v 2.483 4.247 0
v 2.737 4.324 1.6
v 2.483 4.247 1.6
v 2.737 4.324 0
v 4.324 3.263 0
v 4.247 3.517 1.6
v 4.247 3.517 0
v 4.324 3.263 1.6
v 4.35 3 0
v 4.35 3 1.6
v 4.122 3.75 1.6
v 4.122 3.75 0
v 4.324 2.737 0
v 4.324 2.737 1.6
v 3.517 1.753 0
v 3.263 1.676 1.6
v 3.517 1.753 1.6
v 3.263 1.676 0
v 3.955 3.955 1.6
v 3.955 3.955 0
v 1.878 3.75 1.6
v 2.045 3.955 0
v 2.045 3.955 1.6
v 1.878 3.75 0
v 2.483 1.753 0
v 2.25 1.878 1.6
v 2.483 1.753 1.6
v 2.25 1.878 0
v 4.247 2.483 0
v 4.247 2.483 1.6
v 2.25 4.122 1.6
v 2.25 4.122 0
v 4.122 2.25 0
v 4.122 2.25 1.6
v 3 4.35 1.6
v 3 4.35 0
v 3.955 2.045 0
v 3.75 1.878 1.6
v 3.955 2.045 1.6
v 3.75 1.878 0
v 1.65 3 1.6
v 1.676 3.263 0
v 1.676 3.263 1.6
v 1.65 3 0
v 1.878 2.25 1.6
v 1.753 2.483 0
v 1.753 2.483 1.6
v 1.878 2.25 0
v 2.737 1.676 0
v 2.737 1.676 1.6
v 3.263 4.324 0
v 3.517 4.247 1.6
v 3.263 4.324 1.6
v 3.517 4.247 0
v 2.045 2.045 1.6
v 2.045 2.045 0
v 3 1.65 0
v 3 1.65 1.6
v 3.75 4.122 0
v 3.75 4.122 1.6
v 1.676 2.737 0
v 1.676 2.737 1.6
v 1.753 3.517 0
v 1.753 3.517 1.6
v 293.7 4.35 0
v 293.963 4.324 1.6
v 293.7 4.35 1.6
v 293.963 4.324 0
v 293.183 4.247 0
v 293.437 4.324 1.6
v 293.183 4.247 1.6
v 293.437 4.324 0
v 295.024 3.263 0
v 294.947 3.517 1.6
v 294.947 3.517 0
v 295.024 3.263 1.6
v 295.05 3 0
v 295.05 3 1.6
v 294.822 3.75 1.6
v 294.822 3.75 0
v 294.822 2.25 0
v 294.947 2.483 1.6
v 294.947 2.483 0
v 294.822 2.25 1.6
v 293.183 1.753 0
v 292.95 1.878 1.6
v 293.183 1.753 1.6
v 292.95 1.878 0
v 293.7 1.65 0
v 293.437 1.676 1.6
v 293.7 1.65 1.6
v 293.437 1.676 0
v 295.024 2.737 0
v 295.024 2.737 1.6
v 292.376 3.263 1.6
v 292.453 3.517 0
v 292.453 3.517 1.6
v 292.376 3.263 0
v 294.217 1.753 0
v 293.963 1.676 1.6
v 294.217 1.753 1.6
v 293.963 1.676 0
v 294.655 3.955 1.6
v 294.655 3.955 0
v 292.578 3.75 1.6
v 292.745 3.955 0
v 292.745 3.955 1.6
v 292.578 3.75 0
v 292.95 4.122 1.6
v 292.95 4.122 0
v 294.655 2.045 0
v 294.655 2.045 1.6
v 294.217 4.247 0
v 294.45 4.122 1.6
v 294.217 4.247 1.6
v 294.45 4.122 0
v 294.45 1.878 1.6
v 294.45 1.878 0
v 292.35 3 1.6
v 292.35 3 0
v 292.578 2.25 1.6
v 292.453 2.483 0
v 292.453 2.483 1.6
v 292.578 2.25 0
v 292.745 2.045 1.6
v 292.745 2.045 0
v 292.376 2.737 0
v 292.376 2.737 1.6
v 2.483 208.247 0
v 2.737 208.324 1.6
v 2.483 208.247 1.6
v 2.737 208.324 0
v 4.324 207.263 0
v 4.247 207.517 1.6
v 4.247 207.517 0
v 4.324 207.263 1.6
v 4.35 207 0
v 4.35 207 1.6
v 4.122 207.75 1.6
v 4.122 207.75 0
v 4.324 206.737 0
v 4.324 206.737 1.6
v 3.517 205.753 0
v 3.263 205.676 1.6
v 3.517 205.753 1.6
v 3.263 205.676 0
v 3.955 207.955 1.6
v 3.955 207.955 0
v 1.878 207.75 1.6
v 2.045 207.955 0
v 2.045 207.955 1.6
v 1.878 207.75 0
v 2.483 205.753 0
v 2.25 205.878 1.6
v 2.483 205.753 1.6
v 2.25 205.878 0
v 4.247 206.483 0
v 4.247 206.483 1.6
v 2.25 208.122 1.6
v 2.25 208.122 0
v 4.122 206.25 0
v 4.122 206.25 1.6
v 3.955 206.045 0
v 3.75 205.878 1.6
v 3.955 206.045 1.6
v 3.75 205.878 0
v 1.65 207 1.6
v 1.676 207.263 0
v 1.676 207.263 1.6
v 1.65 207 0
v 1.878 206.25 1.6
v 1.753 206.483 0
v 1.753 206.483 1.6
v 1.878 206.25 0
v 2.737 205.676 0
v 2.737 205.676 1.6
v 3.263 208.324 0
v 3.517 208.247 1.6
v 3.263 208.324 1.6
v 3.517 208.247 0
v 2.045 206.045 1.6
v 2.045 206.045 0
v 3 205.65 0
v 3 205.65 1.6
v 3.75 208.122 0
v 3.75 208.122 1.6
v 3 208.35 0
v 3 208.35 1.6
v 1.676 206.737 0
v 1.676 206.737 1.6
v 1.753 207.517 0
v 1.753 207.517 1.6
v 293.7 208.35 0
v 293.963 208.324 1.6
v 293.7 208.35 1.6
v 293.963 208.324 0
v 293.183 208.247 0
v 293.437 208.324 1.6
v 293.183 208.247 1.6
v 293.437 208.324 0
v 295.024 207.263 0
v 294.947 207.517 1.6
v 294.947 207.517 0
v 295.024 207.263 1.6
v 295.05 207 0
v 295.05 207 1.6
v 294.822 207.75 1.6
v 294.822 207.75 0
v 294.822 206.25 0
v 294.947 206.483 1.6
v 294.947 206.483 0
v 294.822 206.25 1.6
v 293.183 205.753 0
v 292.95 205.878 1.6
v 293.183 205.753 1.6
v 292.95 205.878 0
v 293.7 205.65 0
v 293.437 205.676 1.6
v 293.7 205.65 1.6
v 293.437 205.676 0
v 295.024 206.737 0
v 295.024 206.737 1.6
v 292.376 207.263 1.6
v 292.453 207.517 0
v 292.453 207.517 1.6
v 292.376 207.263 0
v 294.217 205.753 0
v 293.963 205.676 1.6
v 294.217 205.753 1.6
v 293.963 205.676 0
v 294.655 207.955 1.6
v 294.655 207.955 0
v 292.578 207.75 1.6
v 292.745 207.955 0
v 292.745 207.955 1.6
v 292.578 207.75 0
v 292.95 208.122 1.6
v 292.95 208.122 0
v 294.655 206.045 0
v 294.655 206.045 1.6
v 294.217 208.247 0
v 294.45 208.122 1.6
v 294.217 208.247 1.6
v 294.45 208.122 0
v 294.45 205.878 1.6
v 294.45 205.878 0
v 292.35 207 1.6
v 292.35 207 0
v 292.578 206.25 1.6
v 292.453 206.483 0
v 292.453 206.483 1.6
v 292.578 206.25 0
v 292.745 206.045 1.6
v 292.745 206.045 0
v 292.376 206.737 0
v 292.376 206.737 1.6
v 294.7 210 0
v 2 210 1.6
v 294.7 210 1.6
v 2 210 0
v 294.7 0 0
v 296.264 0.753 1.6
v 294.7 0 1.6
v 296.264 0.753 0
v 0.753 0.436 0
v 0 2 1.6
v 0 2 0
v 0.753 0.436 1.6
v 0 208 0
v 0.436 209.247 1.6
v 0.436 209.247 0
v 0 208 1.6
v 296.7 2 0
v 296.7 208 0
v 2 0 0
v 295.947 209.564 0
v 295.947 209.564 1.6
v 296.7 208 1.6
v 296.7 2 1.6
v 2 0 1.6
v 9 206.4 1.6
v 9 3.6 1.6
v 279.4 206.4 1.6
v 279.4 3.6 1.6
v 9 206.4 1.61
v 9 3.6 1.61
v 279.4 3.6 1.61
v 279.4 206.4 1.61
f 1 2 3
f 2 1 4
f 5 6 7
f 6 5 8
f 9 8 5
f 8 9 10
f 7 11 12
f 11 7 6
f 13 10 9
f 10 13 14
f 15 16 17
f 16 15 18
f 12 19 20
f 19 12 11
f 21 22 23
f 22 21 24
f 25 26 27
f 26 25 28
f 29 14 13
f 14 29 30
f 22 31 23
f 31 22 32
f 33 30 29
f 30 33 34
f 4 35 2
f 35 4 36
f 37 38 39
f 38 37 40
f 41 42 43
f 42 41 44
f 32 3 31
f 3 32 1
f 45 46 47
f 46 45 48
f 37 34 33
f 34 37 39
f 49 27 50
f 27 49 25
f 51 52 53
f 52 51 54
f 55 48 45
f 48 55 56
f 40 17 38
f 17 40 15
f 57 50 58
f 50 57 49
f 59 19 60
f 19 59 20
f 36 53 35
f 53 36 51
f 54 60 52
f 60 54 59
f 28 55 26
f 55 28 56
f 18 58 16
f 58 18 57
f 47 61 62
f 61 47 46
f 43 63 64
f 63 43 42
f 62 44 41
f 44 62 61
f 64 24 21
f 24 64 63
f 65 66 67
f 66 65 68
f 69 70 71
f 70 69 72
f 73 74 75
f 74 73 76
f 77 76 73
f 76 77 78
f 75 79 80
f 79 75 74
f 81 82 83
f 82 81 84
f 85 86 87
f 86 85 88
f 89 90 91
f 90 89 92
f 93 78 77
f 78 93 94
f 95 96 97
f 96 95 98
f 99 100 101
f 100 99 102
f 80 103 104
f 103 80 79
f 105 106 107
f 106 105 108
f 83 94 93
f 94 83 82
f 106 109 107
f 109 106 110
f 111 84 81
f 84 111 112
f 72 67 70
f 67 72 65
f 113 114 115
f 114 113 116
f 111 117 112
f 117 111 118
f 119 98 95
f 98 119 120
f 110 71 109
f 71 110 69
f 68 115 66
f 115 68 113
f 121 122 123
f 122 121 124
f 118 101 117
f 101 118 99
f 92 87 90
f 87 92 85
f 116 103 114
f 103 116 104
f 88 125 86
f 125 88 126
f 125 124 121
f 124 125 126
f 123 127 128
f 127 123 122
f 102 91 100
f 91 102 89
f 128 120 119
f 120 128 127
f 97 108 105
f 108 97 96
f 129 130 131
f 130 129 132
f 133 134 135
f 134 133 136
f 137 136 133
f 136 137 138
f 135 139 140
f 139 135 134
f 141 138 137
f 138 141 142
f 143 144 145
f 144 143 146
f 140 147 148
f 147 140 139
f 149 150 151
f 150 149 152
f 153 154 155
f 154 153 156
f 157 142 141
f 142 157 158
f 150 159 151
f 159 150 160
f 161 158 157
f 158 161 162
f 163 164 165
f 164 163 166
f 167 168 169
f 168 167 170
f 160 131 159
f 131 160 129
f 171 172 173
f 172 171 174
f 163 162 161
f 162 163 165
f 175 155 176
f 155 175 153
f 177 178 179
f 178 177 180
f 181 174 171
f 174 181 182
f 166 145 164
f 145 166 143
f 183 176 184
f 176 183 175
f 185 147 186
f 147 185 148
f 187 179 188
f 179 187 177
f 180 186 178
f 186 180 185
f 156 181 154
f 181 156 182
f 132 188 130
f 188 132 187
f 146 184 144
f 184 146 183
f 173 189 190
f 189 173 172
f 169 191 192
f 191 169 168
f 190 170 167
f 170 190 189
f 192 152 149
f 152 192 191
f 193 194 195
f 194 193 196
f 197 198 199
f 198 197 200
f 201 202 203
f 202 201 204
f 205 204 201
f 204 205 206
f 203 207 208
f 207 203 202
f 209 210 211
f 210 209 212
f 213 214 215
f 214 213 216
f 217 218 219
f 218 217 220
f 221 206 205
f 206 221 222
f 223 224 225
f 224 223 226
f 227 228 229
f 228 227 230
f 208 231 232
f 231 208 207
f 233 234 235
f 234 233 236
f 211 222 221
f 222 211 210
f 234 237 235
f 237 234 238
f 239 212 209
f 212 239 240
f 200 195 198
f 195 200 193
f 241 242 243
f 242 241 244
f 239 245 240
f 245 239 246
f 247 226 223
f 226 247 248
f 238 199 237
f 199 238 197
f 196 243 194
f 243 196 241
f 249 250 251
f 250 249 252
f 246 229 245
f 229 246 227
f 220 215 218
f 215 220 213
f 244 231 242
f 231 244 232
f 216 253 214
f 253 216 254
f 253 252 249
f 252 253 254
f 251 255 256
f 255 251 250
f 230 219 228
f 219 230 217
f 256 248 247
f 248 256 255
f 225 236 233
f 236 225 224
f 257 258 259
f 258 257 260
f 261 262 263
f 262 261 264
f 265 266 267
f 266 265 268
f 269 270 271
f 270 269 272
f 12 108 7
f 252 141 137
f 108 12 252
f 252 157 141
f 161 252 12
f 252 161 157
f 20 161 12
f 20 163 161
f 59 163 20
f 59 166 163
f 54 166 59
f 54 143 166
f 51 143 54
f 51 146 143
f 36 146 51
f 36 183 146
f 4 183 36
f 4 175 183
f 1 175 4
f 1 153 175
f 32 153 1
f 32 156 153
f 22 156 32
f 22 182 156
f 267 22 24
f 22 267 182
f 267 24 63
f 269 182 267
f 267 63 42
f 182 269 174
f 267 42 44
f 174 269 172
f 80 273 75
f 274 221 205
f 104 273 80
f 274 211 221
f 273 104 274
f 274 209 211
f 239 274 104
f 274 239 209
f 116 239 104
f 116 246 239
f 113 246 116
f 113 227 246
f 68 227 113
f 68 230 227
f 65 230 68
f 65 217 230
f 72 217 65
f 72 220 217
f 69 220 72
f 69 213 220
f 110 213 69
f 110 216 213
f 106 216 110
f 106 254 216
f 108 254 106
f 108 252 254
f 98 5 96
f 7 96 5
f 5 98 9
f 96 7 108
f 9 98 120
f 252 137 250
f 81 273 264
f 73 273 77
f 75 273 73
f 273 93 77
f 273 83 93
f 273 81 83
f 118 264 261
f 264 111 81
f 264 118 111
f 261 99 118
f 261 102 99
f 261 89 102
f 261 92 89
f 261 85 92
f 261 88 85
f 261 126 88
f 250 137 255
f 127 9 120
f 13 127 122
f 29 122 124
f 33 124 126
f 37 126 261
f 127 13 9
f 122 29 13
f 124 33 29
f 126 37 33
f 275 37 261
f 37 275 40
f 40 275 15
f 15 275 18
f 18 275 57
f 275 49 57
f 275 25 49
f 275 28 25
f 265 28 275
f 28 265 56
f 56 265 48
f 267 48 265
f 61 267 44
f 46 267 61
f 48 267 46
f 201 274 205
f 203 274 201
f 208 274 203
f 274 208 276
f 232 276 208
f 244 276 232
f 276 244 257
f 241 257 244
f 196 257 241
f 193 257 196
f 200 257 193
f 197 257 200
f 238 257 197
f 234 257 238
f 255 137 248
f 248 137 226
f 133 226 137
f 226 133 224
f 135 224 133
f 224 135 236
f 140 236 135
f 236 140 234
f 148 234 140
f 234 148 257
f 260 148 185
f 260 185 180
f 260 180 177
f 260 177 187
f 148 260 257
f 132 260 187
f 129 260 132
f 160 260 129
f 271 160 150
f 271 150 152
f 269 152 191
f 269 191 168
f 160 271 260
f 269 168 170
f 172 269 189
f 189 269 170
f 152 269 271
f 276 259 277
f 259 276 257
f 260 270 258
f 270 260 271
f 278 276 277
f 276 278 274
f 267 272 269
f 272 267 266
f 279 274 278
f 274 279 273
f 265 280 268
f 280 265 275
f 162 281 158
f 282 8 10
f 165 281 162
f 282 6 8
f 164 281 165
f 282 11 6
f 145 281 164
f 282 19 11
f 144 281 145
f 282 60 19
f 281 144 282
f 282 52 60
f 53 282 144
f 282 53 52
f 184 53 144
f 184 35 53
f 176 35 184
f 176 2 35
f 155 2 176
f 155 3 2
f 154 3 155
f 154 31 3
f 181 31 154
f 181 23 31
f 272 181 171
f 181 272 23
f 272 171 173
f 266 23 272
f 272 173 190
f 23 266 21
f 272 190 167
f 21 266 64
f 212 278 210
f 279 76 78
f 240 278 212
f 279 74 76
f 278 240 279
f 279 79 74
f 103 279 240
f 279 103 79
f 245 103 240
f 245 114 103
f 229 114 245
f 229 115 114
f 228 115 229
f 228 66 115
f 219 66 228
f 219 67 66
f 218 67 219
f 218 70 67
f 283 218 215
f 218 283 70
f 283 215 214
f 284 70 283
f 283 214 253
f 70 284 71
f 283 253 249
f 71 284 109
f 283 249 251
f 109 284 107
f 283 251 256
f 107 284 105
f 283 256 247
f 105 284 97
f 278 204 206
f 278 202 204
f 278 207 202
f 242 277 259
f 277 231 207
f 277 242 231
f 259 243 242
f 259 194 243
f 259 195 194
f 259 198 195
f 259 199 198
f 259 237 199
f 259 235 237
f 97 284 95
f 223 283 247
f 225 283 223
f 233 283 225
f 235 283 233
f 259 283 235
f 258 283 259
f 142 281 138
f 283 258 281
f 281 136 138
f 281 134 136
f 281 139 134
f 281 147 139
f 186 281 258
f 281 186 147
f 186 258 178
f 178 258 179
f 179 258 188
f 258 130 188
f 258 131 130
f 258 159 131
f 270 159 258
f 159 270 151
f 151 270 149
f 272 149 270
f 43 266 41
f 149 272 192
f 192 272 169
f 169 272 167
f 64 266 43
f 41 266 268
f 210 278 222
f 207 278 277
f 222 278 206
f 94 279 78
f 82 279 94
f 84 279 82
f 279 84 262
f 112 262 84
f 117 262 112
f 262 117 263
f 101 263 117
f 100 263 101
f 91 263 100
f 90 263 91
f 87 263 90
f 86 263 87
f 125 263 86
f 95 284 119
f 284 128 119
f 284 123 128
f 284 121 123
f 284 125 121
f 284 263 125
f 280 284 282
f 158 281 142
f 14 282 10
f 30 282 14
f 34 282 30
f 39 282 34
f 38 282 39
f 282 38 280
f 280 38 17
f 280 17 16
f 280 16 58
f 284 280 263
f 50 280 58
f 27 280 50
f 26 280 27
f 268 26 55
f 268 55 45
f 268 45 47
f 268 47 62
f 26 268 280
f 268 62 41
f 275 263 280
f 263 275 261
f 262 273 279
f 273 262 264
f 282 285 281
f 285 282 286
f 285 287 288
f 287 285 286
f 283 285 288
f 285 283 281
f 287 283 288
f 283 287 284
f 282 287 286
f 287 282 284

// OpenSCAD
// Pimoroni Inky Impression 13.3" — board model
// All dimensions in mm

// --- Parameters ---

// Board outer dimensions
board_width  = 296.70;
board_height = 210.00;
board_thickness = 1.6; // standard PCB, will adjust later

// Corner mounting holes
hole_inset    = 3.00;  // from board edge to hole center
hole_diameter = 2.7;   // M2.5 clearance hole (adjust if needed)

// Corner rounding (estimated, not dimensioned in schematic)
corner_radius = 2.0;

// Viewable area (not centered — connector side has more margin)
viewable_width  = 270.40;
viewable_height = 202.80;
viewable_x = 9.00;  // from left edge
viewable_y = (board_height - viewable_height) / 2; // centered vertically

// --- Derived ---
hole_radius = hole_diameter / 2;

// Hole positions (from bottom-left origin)
hole_positions = [
    [hole_inset, hole_inset],
    [board_width - hole_inset, hole_inset],
    [hole_inset, board_height - hole_inset],
    [board_width - hole_inset, board_height - hole_inset],
];

// --- Model ---

module board() {
    difference() {
        // Board body with rounded corners
        linear_extrude(height = board_thickness)
            offset(r = corner_radius)
            offset(delta = -corner_radius)
            square([board_width, board_height]);

        // Corner mounting holes
        for (pos = hole_positions) {
            translate([pos[0], pos[1], -0.1])
                cylinder(h = board_thickness + 0.2, r = hole_radius, $fn = 32);
        }
    }
}

color("SteelBlue") board();

// Viewable area indicator
color("DarkSlateGray")
    translate([viewable_x, viewable_y, board_thickness - 0.01])
    linear_extrude(height = 0.02)
    square([viewable_width, viewable_height]);
